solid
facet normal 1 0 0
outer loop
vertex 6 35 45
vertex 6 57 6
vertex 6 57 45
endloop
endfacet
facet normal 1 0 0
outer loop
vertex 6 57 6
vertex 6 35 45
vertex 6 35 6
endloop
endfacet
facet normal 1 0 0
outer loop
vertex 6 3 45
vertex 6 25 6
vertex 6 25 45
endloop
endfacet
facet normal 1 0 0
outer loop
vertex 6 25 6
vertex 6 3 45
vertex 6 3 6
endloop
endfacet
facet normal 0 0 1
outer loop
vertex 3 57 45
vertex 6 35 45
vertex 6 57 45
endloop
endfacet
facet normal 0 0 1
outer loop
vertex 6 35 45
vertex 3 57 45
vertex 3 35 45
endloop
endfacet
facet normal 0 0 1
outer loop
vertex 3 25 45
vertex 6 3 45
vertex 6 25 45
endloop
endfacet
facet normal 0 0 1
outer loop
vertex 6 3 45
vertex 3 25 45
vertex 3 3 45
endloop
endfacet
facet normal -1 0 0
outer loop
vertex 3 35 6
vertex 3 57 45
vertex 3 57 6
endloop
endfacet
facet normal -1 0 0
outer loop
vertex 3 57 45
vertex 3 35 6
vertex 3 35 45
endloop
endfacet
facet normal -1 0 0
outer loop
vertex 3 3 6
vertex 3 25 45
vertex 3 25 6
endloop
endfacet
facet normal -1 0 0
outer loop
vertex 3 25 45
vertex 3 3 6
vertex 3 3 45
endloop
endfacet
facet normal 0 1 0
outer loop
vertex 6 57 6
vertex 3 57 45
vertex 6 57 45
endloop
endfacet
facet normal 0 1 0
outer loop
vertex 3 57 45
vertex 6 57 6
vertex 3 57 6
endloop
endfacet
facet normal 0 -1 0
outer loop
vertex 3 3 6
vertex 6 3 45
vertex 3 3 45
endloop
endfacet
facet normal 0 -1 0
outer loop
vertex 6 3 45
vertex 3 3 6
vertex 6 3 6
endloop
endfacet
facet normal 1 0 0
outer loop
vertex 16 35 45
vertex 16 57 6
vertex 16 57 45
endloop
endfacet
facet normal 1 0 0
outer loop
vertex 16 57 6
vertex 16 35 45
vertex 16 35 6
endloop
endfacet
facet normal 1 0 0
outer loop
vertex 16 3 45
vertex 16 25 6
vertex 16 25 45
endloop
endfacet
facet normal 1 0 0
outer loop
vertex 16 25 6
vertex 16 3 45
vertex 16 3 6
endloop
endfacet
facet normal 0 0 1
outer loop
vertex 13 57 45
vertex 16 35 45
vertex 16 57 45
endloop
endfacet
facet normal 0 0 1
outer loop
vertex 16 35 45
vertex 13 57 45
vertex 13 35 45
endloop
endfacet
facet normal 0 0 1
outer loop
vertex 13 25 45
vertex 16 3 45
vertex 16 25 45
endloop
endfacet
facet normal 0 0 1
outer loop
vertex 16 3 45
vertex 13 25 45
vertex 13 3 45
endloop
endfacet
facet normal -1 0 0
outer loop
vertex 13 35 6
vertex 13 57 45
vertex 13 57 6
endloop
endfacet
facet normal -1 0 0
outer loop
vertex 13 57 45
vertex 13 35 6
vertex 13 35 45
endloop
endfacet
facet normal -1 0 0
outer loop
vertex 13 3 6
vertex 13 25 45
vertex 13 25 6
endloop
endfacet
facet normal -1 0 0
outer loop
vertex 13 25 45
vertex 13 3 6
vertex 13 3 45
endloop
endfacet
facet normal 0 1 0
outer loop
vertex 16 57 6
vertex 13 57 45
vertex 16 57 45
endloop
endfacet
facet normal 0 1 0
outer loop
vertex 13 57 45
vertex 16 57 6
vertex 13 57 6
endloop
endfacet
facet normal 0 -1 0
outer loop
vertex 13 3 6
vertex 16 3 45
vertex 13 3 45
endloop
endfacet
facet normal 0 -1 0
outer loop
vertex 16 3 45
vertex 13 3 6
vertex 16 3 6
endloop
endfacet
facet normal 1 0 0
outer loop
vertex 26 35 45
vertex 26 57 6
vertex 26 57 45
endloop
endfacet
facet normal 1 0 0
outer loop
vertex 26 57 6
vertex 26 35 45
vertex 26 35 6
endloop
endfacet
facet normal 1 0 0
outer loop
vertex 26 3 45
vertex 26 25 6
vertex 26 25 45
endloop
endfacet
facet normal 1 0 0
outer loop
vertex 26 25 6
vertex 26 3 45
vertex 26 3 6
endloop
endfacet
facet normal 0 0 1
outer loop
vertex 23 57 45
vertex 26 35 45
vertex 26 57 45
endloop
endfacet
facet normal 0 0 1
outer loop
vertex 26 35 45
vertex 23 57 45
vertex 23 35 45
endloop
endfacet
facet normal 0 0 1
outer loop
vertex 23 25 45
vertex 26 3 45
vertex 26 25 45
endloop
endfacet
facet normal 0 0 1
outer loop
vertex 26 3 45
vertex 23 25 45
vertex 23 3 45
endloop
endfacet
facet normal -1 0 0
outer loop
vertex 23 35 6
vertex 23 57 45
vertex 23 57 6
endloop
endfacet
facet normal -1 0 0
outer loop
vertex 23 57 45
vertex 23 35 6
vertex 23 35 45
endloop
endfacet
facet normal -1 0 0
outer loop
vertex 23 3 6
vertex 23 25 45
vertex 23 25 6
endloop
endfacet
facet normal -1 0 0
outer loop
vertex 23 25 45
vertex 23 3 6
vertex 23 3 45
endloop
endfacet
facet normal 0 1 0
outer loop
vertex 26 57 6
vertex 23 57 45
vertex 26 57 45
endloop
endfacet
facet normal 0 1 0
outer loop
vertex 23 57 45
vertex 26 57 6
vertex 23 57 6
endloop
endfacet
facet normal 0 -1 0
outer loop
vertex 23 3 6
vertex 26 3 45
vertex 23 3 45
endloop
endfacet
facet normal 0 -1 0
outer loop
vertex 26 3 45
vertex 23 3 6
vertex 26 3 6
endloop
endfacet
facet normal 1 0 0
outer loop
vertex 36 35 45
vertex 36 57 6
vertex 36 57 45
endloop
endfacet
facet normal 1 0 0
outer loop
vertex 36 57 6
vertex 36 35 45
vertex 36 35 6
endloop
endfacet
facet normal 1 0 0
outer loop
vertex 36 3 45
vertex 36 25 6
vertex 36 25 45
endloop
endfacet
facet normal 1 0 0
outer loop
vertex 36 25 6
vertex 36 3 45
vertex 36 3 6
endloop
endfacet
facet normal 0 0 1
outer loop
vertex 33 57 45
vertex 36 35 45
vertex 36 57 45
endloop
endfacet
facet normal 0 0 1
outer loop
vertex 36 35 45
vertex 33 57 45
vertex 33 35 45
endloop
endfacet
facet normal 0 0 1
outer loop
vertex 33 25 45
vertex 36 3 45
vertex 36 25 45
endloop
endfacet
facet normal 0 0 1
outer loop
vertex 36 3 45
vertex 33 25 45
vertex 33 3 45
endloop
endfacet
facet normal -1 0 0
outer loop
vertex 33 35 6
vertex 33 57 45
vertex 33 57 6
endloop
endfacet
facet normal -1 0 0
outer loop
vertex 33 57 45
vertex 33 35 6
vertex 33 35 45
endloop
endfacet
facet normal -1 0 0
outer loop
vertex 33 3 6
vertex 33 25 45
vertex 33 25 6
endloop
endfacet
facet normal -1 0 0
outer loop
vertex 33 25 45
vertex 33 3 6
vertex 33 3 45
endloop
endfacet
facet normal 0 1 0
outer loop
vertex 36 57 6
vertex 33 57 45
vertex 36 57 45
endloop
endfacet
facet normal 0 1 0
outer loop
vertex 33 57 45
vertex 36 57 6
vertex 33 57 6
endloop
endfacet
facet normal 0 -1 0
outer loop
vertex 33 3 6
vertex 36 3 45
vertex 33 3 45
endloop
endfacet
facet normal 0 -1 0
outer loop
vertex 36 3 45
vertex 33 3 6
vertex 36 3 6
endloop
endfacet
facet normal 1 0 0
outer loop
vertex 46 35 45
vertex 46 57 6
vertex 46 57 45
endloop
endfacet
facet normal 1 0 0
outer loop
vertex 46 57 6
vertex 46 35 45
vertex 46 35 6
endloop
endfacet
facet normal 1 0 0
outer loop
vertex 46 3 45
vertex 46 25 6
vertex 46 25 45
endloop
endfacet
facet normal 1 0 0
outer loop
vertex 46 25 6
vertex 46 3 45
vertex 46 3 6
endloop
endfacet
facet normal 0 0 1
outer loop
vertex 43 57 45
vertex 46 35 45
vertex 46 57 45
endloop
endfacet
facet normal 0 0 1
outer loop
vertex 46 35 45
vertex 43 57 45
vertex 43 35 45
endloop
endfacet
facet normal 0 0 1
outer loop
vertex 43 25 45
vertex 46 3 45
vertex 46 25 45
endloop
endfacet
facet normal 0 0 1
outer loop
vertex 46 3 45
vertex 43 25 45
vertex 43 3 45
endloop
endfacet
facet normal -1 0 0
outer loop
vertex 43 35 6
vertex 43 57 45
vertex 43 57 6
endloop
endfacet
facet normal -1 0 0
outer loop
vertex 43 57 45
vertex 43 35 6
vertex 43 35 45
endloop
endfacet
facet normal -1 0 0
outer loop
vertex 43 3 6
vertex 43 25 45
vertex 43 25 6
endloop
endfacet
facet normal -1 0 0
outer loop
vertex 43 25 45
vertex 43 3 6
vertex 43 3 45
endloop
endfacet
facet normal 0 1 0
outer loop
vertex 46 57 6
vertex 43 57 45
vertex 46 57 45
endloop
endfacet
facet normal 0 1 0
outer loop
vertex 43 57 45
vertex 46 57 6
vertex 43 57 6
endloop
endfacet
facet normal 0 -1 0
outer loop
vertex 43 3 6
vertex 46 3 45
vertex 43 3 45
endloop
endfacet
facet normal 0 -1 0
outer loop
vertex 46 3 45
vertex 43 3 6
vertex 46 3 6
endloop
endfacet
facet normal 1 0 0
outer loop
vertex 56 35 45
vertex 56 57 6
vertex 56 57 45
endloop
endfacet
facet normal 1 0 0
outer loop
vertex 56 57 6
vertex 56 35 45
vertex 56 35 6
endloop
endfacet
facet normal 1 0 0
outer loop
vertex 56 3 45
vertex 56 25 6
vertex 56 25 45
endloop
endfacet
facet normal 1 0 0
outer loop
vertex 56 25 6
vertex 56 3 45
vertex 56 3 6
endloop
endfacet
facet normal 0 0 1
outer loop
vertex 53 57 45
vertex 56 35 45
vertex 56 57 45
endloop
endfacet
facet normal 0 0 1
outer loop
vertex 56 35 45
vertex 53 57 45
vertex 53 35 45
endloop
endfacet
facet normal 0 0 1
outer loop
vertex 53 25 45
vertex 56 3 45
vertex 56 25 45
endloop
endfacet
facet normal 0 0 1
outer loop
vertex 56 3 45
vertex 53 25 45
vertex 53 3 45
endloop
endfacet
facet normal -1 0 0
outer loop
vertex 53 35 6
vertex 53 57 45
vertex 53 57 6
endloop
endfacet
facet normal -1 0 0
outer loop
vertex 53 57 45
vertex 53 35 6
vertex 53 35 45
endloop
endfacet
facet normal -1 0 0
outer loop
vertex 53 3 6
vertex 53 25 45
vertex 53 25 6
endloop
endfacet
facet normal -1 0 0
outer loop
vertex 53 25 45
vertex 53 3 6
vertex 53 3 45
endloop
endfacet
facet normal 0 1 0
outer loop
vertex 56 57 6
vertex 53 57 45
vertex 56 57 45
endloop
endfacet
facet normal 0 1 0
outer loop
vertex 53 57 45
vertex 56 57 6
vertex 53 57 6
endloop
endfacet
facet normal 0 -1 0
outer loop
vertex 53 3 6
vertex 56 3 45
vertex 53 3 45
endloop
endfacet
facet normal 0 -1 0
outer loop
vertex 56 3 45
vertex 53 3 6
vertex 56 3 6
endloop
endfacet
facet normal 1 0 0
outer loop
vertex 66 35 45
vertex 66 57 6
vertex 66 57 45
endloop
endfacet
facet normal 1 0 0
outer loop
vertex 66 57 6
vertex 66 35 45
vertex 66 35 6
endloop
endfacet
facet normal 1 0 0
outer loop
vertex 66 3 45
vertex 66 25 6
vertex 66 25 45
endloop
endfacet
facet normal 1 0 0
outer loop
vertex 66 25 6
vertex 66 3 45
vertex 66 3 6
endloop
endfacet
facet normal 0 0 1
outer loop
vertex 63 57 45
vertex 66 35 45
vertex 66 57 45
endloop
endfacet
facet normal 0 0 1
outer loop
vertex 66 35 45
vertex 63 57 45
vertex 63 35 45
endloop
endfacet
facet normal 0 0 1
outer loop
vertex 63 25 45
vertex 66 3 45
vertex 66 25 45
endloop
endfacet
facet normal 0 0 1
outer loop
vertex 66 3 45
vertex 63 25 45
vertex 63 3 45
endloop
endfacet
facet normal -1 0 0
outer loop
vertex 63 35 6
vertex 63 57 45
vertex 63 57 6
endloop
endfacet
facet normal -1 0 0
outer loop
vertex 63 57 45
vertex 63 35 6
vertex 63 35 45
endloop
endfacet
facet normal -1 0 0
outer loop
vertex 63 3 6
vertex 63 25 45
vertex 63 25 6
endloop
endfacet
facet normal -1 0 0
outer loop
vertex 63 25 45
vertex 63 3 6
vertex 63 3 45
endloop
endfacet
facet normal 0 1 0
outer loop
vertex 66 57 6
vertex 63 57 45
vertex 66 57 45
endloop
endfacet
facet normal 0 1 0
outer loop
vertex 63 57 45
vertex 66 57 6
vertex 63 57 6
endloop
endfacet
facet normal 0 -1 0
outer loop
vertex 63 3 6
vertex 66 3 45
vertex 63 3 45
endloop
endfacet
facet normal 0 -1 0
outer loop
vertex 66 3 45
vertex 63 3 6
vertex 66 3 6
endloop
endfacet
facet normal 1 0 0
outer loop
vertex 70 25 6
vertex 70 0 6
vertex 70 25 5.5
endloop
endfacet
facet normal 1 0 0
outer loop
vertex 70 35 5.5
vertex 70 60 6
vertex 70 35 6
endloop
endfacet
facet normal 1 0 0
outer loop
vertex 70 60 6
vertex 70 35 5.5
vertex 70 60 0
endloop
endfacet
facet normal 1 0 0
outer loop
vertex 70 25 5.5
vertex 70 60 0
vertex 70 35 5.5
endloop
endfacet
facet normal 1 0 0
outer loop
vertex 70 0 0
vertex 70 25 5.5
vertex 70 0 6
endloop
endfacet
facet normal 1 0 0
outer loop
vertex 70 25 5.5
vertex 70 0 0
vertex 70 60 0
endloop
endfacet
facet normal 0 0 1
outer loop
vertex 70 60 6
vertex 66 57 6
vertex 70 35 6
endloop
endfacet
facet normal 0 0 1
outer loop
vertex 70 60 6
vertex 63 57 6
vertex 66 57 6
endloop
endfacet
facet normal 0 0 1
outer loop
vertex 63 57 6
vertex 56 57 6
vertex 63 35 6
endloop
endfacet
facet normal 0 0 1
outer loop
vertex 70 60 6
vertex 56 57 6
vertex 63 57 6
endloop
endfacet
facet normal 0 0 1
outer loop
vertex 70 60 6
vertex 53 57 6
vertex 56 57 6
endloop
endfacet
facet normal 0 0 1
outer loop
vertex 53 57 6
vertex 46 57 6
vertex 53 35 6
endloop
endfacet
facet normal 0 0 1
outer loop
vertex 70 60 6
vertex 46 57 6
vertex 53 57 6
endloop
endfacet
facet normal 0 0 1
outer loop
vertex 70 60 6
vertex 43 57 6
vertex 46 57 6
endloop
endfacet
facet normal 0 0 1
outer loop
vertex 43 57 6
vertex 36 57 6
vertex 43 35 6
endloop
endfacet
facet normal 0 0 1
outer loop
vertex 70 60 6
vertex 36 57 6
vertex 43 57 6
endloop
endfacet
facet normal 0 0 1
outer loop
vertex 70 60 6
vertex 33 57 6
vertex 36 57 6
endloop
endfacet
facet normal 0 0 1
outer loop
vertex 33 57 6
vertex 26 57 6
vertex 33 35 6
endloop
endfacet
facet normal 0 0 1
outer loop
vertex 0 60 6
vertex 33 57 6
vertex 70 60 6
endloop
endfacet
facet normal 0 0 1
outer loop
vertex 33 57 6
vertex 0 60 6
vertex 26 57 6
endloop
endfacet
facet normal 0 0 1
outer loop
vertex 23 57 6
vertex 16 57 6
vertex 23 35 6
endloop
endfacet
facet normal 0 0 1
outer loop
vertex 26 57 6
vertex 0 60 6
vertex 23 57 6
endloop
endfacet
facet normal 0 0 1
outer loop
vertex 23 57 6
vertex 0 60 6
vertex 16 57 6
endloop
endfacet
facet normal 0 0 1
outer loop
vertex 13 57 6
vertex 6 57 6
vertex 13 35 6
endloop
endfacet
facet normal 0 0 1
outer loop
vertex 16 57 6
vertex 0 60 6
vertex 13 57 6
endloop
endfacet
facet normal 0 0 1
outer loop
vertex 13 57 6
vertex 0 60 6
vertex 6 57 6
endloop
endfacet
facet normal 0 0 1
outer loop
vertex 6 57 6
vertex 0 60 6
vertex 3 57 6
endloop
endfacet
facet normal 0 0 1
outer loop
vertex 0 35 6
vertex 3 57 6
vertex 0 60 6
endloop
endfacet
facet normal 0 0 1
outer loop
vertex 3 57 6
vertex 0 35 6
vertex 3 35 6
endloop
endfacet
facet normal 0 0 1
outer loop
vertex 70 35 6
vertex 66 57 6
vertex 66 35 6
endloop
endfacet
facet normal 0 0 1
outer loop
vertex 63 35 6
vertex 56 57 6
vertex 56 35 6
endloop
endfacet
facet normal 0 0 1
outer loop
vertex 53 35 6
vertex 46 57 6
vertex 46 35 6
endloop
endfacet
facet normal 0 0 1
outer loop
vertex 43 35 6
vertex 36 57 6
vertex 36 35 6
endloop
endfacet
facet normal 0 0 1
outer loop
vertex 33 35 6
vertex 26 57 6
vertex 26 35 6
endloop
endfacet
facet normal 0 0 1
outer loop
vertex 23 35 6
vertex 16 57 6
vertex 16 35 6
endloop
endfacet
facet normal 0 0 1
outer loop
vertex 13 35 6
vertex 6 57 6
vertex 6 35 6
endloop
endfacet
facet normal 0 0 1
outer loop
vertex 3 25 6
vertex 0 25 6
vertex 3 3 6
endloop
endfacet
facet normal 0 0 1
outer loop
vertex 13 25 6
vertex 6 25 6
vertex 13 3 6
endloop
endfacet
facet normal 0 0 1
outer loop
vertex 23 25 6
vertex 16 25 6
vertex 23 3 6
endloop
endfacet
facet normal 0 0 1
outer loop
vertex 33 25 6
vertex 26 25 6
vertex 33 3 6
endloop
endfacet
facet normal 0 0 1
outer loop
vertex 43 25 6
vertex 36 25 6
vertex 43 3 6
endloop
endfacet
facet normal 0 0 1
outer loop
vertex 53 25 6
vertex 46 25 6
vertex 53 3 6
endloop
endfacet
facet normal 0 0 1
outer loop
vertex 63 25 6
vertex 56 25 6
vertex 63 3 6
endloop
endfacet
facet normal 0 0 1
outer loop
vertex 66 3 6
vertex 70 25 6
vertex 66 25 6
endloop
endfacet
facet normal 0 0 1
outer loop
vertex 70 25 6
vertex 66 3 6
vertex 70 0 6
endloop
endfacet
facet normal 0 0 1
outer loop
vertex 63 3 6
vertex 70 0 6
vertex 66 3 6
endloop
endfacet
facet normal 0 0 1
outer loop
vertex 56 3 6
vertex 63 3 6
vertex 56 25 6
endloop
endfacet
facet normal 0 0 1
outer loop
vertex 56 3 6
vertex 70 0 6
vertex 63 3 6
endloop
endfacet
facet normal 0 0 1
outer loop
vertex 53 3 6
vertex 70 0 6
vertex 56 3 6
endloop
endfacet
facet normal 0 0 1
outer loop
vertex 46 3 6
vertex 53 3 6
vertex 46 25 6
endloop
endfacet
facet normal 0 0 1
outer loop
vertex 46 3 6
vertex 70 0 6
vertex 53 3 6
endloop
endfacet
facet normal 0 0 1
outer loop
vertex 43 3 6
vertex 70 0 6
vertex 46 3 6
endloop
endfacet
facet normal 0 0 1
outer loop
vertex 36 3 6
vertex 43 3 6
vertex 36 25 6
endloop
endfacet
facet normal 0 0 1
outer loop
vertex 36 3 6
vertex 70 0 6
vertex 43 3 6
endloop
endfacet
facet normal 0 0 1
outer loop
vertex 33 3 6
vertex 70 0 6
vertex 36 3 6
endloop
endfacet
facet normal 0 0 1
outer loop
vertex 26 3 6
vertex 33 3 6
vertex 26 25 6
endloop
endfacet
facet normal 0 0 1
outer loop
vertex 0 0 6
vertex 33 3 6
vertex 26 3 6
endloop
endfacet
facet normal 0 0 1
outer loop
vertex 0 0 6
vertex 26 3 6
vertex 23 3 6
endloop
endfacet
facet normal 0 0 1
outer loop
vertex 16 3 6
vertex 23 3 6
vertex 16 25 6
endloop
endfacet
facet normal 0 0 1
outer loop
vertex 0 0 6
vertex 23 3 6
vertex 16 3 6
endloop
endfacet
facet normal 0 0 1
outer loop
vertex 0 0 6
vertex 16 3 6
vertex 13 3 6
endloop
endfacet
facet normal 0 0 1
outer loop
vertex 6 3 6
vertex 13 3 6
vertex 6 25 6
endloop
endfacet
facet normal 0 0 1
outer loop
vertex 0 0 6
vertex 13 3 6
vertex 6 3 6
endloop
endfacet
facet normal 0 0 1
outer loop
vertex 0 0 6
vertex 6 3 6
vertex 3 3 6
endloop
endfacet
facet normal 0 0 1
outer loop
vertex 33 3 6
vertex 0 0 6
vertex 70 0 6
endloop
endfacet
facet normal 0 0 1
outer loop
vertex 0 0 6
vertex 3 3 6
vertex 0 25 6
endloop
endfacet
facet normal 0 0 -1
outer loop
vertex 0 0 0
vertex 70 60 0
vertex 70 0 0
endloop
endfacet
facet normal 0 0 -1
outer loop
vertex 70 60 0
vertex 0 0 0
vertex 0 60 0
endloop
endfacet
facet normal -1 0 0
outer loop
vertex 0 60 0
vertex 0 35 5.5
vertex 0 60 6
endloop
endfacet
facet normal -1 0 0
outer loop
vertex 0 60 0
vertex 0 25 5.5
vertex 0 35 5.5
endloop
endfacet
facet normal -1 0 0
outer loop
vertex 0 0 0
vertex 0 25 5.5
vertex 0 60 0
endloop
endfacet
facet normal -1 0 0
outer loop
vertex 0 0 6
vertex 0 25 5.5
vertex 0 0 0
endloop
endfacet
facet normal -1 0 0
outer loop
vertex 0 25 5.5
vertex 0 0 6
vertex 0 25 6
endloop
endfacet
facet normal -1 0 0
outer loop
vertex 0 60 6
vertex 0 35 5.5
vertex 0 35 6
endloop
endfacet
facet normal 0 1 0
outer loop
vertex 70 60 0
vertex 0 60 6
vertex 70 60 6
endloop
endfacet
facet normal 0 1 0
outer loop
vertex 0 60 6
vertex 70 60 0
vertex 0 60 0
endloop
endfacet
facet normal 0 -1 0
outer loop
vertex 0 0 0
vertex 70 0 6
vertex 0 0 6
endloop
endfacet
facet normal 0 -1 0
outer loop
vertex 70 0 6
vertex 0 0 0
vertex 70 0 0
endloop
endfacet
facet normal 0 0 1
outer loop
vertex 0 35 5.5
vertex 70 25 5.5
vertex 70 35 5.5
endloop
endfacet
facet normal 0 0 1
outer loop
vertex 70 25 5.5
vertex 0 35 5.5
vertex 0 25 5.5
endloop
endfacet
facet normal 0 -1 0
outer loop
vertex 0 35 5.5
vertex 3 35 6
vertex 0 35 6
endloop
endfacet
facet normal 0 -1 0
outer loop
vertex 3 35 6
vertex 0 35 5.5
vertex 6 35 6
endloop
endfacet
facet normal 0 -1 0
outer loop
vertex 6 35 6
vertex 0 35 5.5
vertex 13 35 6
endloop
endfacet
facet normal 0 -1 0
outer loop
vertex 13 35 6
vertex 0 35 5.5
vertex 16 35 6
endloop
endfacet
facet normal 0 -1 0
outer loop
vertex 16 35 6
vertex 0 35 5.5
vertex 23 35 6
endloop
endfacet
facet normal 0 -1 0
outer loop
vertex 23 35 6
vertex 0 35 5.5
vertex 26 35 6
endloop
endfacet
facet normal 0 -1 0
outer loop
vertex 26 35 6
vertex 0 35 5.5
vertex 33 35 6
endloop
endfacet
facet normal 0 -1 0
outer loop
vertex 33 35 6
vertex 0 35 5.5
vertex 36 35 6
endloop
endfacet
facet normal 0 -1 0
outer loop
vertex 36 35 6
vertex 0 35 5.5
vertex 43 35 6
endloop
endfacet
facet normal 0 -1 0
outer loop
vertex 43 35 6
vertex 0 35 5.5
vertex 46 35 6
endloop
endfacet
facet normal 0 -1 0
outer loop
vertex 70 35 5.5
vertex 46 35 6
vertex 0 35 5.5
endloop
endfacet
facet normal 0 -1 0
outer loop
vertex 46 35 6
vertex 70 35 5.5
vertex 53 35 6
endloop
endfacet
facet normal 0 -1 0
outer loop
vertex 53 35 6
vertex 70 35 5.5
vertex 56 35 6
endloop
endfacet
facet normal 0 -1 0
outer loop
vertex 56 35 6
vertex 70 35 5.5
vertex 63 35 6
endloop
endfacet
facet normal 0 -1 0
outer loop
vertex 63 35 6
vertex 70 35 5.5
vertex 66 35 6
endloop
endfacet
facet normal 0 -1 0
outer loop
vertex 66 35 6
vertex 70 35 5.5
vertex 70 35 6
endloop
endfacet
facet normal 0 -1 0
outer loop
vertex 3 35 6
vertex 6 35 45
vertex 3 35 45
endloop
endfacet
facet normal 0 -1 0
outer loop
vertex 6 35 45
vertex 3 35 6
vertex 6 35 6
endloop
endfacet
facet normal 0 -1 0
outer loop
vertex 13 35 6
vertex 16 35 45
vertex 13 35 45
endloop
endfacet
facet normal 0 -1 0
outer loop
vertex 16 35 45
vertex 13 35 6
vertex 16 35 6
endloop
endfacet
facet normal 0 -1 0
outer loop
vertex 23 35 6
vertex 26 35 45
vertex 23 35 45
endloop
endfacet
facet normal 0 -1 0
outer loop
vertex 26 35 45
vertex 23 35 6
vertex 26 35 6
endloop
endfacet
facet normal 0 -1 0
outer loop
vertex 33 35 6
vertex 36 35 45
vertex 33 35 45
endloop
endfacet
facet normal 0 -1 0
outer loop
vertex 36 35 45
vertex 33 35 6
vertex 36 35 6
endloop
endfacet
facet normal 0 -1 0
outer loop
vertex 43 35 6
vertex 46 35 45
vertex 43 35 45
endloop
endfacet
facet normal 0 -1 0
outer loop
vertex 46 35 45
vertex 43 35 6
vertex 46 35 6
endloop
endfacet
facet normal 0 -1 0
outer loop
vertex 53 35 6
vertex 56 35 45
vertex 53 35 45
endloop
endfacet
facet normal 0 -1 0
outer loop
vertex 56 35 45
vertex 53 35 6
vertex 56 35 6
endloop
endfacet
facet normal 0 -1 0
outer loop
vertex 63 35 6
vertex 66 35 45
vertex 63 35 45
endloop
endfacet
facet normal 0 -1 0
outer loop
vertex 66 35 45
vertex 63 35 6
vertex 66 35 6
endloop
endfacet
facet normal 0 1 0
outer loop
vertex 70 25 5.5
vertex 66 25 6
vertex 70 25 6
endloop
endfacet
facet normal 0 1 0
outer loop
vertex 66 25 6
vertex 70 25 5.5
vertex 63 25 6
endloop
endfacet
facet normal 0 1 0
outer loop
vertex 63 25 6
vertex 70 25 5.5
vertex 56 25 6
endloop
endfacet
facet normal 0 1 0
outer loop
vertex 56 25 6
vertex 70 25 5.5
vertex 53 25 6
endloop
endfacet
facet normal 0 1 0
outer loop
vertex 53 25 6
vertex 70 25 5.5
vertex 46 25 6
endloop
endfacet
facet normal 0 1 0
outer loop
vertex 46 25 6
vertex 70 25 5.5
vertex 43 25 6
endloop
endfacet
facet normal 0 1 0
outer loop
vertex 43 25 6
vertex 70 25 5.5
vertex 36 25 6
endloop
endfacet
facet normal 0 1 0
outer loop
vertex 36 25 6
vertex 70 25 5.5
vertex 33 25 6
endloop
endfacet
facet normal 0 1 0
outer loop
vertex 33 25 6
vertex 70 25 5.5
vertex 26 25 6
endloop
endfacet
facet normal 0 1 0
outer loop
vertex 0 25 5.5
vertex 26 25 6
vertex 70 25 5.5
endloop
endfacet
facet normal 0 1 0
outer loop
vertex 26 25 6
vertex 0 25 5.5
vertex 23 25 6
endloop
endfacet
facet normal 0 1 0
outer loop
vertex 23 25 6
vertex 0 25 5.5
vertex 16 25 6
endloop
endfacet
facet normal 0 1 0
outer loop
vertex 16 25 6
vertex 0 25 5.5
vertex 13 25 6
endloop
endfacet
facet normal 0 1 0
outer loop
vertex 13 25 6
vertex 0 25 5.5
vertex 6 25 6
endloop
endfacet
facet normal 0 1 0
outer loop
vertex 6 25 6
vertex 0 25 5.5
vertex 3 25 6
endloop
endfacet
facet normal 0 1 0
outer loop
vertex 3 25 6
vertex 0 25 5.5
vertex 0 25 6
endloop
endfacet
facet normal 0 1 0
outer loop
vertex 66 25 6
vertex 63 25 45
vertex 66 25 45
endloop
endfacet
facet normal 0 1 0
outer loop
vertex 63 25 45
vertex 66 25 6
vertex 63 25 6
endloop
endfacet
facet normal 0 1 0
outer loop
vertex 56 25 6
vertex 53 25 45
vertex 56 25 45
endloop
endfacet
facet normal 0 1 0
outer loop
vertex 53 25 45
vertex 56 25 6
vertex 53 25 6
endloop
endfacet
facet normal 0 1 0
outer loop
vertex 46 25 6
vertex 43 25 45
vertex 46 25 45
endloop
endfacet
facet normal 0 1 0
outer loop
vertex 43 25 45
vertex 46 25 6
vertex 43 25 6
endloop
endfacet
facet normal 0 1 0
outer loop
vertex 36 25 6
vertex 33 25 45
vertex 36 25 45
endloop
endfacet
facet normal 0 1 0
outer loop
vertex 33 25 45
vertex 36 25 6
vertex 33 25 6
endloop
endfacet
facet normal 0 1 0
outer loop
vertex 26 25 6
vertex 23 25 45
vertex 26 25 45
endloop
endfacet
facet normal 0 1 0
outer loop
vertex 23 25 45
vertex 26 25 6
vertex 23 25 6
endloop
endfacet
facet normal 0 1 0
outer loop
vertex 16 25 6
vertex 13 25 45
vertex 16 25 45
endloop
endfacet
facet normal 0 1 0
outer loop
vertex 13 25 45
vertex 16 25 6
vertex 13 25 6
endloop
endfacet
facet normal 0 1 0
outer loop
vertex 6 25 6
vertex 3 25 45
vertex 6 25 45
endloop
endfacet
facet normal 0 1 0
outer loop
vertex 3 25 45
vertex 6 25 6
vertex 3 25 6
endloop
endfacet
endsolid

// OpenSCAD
$fn = 32;

// ----------------------------------------------------------------------
// Heatsink: slotted fin block
// ----------------------------------------------------------------------

// --- parameters (mm) ---
base_l = 70;              // base length, X
base_w = 60;              // base width, Y
base_t = 6;               // base plate thickness
fin_h = 40;               // fin height above the base
fin_t = 3;                // fin thickness
edge = 3;                 // margin from the base ends
pitch = 10;               // fin pitch
slot_w = 10;              // central slot width, Y
fit_tol = 0.1;            // tolerance for press fits, mm
free_tol = 0.5;           // tolerance for clearance fits, mm

n_fins = floor((base_l - 2 * edge - fin_t) / pitch) + 1;  // fin count
total_h = base_t + fin_h - 1;  // overall height

difference() {
union() {
  cube([base_l, base_w, base_t]);
  for (i = [0 : n_fins - 1])
    translate([edge + i * pitch, edge, base_t - 1])
      cube([fin_t, base_w - 2 * edge, fin_h]);
}
  translate([-1, base_w / 2 - slot_w / 2, base_t - 0.5])
    cube([base_l + 2, slot_w, fin_h + 2]);
}
